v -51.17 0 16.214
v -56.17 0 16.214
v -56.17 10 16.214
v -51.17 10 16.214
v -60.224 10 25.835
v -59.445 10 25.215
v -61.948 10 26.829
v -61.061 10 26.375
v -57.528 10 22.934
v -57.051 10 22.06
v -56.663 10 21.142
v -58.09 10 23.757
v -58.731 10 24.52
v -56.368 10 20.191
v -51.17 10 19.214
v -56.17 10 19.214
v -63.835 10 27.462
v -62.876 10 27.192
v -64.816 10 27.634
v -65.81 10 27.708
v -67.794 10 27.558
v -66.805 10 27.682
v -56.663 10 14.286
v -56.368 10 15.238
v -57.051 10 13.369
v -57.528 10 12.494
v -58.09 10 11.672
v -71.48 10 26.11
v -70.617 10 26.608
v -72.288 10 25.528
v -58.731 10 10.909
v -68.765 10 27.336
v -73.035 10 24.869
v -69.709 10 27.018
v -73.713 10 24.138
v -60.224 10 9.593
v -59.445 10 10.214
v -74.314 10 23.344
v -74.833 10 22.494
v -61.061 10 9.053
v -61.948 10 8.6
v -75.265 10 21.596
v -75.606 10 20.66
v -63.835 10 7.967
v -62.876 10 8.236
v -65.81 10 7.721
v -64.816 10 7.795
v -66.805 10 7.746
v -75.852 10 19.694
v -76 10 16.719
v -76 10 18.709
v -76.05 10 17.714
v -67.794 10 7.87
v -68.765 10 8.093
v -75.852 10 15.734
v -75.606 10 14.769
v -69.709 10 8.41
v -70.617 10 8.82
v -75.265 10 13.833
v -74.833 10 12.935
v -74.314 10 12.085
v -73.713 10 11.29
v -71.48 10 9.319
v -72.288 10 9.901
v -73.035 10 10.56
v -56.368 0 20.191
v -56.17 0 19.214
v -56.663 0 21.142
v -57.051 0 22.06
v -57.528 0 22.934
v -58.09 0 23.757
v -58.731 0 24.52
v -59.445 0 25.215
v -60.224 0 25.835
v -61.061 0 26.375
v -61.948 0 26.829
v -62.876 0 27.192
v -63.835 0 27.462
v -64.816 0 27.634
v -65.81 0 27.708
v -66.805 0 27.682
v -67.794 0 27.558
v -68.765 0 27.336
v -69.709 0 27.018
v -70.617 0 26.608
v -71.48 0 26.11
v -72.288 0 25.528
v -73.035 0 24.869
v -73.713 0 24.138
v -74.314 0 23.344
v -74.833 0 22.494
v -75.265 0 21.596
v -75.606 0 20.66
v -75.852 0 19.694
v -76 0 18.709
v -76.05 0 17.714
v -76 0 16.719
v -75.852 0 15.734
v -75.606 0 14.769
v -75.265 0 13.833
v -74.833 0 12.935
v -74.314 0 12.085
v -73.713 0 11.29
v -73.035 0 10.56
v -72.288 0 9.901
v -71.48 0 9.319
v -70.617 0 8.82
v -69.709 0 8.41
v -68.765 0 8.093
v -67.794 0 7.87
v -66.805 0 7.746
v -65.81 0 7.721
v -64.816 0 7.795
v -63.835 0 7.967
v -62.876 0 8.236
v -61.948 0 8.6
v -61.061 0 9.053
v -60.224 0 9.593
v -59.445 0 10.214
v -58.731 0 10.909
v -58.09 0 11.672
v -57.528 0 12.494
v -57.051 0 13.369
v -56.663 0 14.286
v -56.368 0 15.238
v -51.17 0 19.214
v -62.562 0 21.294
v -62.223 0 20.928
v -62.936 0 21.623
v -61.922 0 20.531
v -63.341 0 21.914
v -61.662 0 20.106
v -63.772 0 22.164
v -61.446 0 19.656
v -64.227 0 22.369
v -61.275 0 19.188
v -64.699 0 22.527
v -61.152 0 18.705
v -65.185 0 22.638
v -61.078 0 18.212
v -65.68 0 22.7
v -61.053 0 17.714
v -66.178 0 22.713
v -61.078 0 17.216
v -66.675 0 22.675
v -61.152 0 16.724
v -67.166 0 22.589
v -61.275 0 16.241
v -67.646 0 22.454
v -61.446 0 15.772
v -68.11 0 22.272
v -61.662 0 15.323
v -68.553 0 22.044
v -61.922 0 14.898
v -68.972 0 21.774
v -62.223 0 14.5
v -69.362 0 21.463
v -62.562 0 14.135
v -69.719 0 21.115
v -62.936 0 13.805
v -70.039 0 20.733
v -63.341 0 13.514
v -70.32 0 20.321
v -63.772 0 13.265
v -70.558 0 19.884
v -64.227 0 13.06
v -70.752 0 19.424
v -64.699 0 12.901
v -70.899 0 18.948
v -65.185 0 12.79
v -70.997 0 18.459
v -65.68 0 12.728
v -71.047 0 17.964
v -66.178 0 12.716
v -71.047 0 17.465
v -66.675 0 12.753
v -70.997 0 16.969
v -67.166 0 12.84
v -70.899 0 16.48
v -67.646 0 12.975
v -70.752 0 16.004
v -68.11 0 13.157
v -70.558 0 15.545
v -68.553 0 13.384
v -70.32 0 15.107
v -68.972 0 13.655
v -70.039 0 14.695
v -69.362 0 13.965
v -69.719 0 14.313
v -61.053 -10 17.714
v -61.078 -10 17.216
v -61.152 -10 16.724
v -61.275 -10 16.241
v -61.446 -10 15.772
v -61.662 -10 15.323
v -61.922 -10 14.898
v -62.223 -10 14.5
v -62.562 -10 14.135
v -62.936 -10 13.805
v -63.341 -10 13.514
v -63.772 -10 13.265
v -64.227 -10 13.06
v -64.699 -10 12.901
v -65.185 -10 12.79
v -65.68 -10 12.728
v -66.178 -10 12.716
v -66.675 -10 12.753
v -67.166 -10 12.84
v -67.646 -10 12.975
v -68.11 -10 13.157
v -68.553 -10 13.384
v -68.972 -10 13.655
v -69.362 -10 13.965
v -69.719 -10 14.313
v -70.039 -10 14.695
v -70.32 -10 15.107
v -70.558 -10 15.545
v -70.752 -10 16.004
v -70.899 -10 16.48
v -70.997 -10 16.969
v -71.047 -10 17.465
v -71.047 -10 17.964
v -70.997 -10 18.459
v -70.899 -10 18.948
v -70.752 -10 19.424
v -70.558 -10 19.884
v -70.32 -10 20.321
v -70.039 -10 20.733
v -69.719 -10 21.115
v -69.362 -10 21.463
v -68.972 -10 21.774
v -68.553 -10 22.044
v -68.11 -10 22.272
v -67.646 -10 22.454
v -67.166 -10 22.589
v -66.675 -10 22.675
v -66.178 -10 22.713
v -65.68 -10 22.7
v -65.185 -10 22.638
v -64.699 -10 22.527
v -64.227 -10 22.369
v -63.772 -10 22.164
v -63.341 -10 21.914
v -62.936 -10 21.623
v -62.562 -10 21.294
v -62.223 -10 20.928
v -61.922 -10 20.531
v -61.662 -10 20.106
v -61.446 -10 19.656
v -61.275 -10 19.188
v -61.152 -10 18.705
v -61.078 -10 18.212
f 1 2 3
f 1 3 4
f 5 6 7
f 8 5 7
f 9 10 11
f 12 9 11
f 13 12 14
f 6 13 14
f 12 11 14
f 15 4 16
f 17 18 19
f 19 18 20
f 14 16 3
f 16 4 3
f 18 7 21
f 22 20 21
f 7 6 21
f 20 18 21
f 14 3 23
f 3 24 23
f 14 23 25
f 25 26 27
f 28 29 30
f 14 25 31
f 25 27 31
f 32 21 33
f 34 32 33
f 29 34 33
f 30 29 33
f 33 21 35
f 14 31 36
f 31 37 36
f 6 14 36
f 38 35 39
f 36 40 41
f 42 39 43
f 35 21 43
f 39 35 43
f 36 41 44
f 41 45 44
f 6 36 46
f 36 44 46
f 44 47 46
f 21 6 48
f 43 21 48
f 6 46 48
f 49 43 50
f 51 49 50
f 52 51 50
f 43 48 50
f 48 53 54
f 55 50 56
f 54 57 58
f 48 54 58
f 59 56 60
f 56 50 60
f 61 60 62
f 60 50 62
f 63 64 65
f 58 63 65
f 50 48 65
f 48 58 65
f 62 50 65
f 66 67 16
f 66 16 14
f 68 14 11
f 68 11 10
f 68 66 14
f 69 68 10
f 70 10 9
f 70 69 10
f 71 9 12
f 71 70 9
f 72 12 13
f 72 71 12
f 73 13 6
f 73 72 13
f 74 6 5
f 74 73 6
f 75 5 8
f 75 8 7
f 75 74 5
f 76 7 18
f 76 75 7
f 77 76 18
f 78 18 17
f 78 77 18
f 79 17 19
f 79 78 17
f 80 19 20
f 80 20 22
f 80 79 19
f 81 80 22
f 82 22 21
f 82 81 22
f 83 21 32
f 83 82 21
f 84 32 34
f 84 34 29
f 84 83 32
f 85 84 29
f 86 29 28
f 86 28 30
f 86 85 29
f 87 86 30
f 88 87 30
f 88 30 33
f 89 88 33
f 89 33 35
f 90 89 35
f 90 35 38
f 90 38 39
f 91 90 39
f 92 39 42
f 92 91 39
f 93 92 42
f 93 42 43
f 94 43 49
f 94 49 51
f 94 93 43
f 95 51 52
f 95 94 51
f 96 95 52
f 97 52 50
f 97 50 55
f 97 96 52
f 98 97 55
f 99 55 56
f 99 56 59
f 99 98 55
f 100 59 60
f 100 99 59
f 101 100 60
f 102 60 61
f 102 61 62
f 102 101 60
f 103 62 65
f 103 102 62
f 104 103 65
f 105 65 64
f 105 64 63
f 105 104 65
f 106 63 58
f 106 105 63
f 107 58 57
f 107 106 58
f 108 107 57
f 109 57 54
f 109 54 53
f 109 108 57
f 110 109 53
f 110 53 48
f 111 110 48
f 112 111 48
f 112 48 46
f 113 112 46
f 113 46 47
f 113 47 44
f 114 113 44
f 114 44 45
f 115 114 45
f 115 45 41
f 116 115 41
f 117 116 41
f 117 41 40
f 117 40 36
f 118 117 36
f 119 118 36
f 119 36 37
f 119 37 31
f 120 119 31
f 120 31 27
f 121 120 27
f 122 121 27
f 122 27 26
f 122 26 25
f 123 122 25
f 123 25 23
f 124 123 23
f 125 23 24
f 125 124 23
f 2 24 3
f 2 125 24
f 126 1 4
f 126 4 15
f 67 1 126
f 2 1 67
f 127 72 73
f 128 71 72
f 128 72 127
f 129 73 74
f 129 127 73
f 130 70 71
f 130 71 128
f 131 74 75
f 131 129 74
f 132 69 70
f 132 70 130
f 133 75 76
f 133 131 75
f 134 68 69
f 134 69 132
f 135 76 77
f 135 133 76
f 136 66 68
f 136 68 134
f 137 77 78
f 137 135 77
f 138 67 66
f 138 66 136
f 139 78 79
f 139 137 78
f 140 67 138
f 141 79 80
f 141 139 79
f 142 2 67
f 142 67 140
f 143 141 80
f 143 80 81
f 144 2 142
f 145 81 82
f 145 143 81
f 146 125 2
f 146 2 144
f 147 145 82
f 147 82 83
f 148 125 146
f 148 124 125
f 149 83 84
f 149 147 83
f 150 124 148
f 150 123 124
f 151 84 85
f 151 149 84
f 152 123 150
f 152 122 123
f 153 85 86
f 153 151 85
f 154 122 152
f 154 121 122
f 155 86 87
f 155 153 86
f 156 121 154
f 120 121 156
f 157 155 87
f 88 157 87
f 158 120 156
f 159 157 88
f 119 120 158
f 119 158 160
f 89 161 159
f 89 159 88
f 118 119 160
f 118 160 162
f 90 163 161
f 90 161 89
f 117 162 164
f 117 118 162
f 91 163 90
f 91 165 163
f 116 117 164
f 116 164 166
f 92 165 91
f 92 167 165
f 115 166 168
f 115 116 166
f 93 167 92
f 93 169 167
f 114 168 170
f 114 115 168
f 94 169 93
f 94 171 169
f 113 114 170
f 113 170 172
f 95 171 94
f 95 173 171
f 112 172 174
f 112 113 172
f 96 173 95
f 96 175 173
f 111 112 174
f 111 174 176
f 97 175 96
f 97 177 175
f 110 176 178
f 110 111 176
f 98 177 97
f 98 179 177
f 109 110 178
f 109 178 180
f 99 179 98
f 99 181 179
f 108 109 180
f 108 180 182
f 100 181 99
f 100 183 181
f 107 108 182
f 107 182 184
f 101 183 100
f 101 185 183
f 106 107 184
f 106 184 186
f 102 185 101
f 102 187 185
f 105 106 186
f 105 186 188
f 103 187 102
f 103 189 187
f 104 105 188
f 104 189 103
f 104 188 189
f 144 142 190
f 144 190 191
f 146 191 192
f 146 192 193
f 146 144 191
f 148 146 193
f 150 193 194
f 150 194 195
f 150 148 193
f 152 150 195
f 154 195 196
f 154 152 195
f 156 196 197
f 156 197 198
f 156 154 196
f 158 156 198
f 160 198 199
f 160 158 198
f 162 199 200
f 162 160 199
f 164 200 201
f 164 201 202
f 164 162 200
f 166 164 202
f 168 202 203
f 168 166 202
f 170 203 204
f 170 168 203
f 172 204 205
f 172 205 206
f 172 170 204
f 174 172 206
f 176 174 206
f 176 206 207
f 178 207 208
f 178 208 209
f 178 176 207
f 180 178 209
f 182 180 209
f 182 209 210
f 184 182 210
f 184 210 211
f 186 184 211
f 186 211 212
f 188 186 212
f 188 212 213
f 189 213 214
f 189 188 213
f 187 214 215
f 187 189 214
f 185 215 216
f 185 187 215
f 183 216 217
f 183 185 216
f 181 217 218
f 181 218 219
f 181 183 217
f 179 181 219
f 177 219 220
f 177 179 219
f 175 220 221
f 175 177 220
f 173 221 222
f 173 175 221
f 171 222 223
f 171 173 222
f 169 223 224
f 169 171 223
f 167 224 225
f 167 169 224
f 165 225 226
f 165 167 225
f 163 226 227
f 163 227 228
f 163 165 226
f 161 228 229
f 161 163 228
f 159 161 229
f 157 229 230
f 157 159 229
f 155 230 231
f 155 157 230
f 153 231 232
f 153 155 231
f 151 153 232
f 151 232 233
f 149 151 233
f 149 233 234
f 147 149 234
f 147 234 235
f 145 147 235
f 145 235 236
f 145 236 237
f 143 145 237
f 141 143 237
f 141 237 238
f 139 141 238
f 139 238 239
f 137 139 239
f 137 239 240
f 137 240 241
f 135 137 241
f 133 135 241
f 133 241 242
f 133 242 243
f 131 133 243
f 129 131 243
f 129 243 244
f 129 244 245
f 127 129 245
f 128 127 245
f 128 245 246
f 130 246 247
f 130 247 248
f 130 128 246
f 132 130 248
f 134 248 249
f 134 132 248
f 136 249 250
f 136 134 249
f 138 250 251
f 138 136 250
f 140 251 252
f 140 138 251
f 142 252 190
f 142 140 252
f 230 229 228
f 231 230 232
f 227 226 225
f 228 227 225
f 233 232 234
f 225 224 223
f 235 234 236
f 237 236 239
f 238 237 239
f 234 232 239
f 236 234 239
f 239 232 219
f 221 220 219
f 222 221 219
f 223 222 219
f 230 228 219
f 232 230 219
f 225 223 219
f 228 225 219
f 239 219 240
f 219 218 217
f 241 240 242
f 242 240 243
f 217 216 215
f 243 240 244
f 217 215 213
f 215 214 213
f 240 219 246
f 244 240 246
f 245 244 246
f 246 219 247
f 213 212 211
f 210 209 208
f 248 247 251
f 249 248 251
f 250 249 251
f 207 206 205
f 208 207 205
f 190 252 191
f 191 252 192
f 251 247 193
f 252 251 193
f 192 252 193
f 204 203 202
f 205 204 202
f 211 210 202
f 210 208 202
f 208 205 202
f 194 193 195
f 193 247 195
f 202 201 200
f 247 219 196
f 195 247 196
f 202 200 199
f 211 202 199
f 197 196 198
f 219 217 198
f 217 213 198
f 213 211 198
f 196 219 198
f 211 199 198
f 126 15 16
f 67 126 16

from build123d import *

# Parameters (mm, degrees)
BOSS_EXTRUDE1_DEPTH = 10
SKETCH1_3_R         = 5
BOSS_EXTRUDE2_DEPTH = 10


with BuildPart() as part:
    # Sketch1 → Boss-Extrude1 (new body)
    with BuildSketch(Plane(origin=(0, 0, 0), x_dir=(1, 0, 0), z_dir=(0, 1, 0))):
        with BuildLine():
            Line((-51.169981336, -16.214278262), (-56.169981336, -16.214278262))
            ThreePointArc((-56.169981336, -16.214278262), (-76.049815498, -17.714278262), (-56.169981336, -19.214278262))
            Line((-56.169981336, -19.214278262), (-51.169981336, -19.214278262))
            Line((-51.169981336, -19.214278262), (-51.169981336, -16.214278262))
        make_face()
    extrude(amount=BOSS_EXTRUDE1_DEPTH)

    # Sketch1<3> → Boss-Extrude2 (add)
    with BuildSketch(Plane(origin=(0, 0, 0), x_dir=(1, 0, 0), z_dir=(0, 1, 0))):
        with Locations((-66.053308407, -17.714278262)):
            Circle(SKETCH1_3_R)
    extrude(amount=-BOSS_EXTRUDE2_DEPTH)


solid = part.part
